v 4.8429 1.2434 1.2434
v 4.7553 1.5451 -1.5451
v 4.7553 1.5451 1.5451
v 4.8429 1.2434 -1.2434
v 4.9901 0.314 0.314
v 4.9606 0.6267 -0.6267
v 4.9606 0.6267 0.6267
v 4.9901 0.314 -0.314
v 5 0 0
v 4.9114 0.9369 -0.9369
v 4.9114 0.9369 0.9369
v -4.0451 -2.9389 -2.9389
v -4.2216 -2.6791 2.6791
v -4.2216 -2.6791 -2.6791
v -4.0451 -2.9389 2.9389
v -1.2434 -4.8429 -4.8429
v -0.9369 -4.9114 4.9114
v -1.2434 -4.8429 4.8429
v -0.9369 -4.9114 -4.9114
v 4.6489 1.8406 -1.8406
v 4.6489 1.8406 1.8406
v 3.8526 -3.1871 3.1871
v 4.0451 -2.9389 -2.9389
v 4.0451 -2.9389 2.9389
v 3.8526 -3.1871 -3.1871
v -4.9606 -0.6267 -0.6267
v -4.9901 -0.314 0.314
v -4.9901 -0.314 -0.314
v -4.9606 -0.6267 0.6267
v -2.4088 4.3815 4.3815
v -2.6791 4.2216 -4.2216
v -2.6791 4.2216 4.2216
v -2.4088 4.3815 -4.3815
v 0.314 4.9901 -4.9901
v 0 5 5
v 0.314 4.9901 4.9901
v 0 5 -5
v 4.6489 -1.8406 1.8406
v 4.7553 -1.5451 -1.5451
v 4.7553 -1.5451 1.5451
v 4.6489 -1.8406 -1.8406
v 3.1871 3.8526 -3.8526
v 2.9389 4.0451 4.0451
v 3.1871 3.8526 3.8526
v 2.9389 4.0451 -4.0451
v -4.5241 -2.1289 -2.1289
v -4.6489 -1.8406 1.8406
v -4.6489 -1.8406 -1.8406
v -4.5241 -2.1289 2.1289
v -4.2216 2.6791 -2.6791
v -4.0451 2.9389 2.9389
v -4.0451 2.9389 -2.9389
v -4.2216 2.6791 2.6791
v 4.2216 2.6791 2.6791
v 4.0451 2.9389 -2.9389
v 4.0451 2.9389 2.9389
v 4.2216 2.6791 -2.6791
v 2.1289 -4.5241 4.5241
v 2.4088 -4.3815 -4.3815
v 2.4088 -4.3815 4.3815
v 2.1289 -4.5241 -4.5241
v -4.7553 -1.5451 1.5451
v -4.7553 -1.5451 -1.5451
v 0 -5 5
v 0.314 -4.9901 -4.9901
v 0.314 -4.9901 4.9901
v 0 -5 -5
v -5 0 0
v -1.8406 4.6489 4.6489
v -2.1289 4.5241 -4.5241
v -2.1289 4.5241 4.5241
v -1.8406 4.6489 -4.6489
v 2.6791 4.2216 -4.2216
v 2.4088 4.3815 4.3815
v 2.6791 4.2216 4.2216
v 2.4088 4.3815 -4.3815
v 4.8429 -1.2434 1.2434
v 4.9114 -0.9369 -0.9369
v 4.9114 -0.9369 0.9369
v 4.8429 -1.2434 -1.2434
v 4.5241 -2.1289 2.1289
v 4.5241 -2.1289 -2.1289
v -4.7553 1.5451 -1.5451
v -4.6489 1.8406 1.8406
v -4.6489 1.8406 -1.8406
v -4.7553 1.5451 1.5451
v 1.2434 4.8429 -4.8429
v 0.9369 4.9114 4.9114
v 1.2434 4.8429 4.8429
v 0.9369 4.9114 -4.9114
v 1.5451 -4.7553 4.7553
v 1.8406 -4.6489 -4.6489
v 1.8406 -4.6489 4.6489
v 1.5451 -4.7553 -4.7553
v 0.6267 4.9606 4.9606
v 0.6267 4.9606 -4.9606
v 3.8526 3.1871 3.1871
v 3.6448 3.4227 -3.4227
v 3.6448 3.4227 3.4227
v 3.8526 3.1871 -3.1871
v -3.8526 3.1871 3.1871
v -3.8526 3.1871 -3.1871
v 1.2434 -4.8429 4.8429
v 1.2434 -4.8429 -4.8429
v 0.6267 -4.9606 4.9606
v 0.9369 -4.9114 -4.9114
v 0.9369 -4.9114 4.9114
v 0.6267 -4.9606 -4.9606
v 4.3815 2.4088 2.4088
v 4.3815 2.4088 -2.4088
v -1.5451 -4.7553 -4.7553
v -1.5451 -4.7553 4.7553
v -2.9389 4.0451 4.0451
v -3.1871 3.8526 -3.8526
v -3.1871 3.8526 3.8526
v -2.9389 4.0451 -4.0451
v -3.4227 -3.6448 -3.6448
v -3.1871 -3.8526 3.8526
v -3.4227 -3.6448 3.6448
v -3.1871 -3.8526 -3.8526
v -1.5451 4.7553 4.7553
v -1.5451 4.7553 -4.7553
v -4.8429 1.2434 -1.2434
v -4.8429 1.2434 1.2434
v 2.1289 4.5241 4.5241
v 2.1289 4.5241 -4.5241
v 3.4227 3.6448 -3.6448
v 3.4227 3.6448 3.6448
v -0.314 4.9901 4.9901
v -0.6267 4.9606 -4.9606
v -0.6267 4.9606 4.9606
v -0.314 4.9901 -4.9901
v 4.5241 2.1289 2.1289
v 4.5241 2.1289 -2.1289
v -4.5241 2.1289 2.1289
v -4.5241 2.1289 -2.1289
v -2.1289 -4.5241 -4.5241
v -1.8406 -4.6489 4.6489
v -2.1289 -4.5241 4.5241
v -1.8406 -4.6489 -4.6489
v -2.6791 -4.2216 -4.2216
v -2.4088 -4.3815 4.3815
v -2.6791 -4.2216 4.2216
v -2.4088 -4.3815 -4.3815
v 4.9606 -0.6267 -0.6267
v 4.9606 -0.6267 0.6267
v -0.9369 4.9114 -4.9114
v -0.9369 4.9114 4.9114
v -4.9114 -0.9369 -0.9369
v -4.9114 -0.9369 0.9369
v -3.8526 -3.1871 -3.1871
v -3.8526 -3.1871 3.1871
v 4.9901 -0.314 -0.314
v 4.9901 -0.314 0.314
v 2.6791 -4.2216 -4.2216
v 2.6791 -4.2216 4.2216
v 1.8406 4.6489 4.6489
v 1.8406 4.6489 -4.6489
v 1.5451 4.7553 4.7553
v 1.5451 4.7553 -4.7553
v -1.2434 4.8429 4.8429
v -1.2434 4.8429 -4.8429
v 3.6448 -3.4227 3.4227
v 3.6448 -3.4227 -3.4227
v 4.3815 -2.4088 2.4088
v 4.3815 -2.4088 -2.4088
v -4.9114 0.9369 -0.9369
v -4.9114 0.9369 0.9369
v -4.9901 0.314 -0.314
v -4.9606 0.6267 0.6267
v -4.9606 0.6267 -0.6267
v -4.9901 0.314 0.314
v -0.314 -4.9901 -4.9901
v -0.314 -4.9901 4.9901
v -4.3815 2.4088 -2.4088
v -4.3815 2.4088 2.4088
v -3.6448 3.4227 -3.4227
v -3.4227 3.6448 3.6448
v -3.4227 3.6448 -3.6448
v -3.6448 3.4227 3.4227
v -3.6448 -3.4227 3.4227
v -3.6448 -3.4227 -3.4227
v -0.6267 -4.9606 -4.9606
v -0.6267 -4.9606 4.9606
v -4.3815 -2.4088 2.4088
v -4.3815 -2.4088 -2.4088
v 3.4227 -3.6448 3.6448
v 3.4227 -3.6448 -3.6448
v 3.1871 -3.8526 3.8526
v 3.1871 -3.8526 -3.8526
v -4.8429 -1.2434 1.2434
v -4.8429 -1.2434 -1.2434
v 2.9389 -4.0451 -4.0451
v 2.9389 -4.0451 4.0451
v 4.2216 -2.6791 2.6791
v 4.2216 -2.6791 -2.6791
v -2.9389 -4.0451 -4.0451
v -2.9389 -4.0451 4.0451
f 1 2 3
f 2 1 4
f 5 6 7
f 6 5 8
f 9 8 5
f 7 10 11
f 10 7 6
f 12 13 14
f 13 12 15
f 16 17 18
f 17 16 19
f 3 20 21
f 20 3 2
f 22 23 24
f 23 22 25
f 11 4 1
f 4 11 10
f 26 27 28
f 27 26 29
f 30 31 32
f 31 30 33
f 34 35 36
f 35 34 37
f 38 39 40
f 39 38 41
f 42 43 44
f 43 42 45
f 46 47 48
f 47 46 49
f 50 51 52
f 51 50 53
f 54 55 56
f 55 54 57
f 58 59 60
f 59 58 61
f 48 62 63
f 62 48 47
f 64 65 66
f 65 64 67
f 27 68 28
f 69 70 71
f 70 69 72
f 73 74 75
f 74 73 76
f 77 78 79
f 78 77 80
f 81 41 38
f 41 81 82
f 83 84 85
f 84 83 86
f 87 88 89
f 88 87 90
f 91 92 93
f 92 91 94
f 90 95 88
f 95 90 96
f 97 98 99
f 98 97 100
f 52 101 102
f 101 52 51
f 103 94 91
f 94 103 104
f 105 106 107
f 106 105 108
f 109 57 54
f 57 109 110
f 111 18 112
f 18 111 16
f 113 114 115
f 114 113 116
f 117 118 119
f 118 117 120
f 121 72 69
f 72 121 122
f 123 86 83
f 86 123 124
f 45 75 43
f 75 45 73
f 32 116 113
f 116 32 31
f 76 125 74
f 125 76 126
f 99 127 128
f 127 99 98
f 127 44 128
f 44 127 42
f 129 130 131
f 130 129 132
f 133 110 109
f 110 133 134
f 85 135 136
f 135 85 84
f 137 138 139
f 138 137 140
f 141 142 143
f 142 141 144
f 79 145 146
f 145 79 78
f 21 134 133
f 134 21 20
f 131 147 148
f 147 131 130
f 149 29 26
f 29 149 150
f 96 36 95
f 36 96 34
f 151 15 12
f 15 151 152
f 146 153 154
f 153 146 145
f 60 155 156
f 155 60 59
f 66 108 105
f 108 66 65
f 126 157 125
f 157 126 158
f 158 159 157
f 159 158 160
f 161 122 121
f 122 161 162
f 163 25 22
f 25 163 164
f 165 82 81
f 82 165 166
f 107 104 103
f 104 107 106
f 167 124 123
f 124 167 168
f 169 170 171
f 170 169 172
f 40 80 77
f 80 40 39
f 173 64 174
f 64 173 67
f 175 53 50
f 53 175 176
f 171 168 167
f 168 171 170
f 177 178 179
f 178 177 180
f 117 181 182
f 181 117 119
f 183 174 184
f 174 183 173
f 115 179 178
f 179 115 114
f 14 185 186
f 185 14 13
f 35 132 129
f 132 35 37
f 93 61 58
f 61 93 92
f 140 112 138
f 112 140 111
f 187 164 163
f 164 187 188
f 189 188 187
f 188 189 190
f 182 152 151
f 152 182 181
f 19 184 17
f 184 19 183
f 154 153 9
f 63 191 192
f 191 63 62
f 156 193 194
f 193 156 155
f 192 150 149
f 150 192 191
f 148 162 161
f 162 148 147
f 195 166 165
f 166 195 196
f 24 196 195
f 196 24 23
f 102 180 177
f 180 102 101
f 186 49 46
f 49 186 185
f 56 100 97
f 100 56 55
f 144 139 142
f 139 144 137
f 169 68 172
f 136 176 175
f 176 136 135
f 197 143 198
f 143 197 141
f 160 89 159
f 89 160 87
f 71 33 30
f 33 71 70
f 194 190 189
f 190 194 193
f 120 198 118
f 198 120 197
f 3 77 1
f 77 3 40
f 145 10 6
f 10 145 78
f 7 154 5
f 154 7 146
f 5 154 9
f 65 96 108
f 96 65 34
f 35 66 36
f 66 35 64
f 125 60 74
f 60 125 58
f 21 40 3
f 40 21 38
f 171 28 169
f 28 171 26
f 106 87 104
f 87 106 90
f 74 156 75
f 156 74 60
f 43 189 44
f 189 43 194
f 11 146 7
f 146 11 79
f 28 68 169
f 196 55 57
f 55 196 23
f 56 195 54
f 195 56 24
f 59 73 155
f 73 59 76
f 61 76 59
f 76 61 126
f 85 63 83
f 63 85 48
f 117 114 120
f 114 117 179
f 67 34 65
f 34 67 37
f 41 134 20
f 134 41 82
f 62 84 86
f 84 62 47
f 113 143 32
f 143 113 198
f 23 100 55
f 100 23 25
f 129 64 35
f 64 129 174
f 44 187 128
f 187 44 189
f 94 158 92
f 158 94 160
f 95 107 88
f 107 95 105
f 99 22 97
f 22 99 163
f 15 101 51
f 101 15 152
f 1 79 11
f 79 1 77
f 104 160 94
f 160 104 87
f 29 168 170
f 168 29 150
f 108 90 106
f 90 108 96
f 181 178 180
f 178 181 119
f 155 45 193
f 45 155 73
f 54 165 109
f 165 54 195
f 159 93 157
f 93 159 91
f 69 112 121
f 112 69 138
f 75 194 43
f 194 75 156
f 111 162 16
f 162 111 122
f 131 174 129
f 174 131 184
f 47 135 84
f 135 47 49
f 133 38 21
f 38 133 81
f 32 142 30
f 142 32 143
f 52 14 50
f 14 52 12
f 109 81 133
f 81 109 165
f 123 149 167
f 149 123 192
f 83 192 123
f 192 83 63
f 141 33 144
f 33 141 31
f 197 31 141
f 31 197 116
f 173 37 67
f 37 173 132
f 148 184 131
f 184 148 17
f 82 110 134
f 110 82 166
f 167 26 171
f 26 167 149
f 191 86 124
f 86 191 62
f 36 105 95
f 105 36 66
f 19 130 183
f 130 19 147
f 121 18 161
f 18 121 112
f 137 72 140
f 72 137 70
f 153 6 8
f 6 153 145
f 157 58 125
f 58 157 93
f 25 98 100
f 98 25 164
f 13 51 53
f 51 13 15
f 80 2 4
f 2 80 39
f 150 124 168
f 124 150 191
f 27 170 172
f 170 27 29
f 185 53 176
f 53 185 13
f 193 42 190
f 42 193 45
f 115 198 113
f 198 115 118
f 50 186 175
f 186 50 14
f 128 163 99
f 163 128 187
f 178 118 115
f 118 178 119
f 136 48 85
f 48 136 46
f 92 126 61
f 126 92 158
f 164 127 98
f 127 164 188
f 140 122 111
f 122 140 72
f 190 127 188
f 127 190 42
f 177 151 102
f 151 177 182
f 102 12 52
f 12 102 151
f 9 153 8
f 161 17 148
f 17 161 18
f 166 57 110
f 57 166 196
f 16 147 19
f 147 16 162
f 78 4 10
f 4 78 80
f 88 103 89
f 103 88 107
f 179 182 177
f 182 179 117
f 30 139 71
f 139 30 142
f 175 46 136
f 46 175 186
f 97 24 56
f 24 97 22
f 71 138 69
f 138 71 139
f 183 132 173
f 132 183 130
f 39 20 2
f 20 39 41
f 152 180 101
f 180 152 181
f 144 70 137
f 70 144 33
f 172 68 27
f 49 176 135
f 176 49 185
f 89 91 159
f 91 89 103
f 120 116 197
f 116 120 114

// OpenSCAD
/* # Steinmetz solid
 *
 * A _Steinmetz solid_ is
 *
 * > the solid body obtained as the intersection of two or three cylinders of equal radius at right angles.
 *
 * ## Parameters
 *
 * * **size**: determines how big the Steinmetz solid is.
 * * **three**: a boolean controlling the number of cylinders.
 */

$fn=100;

steinmetz(three=false);

module steinmetz(size=10, three=false) {
  intersection() {
    rotate([ 0, 0, 0]) cylinder(h=size, d=size, center=true);
    rotate([90, 0, 0]) cylinder(h=size, d=size, center=true);
    if (three) {
      rotate([0, 90, 0]) cylinder(h=size, d=size, center=true);
    }
   }
}
